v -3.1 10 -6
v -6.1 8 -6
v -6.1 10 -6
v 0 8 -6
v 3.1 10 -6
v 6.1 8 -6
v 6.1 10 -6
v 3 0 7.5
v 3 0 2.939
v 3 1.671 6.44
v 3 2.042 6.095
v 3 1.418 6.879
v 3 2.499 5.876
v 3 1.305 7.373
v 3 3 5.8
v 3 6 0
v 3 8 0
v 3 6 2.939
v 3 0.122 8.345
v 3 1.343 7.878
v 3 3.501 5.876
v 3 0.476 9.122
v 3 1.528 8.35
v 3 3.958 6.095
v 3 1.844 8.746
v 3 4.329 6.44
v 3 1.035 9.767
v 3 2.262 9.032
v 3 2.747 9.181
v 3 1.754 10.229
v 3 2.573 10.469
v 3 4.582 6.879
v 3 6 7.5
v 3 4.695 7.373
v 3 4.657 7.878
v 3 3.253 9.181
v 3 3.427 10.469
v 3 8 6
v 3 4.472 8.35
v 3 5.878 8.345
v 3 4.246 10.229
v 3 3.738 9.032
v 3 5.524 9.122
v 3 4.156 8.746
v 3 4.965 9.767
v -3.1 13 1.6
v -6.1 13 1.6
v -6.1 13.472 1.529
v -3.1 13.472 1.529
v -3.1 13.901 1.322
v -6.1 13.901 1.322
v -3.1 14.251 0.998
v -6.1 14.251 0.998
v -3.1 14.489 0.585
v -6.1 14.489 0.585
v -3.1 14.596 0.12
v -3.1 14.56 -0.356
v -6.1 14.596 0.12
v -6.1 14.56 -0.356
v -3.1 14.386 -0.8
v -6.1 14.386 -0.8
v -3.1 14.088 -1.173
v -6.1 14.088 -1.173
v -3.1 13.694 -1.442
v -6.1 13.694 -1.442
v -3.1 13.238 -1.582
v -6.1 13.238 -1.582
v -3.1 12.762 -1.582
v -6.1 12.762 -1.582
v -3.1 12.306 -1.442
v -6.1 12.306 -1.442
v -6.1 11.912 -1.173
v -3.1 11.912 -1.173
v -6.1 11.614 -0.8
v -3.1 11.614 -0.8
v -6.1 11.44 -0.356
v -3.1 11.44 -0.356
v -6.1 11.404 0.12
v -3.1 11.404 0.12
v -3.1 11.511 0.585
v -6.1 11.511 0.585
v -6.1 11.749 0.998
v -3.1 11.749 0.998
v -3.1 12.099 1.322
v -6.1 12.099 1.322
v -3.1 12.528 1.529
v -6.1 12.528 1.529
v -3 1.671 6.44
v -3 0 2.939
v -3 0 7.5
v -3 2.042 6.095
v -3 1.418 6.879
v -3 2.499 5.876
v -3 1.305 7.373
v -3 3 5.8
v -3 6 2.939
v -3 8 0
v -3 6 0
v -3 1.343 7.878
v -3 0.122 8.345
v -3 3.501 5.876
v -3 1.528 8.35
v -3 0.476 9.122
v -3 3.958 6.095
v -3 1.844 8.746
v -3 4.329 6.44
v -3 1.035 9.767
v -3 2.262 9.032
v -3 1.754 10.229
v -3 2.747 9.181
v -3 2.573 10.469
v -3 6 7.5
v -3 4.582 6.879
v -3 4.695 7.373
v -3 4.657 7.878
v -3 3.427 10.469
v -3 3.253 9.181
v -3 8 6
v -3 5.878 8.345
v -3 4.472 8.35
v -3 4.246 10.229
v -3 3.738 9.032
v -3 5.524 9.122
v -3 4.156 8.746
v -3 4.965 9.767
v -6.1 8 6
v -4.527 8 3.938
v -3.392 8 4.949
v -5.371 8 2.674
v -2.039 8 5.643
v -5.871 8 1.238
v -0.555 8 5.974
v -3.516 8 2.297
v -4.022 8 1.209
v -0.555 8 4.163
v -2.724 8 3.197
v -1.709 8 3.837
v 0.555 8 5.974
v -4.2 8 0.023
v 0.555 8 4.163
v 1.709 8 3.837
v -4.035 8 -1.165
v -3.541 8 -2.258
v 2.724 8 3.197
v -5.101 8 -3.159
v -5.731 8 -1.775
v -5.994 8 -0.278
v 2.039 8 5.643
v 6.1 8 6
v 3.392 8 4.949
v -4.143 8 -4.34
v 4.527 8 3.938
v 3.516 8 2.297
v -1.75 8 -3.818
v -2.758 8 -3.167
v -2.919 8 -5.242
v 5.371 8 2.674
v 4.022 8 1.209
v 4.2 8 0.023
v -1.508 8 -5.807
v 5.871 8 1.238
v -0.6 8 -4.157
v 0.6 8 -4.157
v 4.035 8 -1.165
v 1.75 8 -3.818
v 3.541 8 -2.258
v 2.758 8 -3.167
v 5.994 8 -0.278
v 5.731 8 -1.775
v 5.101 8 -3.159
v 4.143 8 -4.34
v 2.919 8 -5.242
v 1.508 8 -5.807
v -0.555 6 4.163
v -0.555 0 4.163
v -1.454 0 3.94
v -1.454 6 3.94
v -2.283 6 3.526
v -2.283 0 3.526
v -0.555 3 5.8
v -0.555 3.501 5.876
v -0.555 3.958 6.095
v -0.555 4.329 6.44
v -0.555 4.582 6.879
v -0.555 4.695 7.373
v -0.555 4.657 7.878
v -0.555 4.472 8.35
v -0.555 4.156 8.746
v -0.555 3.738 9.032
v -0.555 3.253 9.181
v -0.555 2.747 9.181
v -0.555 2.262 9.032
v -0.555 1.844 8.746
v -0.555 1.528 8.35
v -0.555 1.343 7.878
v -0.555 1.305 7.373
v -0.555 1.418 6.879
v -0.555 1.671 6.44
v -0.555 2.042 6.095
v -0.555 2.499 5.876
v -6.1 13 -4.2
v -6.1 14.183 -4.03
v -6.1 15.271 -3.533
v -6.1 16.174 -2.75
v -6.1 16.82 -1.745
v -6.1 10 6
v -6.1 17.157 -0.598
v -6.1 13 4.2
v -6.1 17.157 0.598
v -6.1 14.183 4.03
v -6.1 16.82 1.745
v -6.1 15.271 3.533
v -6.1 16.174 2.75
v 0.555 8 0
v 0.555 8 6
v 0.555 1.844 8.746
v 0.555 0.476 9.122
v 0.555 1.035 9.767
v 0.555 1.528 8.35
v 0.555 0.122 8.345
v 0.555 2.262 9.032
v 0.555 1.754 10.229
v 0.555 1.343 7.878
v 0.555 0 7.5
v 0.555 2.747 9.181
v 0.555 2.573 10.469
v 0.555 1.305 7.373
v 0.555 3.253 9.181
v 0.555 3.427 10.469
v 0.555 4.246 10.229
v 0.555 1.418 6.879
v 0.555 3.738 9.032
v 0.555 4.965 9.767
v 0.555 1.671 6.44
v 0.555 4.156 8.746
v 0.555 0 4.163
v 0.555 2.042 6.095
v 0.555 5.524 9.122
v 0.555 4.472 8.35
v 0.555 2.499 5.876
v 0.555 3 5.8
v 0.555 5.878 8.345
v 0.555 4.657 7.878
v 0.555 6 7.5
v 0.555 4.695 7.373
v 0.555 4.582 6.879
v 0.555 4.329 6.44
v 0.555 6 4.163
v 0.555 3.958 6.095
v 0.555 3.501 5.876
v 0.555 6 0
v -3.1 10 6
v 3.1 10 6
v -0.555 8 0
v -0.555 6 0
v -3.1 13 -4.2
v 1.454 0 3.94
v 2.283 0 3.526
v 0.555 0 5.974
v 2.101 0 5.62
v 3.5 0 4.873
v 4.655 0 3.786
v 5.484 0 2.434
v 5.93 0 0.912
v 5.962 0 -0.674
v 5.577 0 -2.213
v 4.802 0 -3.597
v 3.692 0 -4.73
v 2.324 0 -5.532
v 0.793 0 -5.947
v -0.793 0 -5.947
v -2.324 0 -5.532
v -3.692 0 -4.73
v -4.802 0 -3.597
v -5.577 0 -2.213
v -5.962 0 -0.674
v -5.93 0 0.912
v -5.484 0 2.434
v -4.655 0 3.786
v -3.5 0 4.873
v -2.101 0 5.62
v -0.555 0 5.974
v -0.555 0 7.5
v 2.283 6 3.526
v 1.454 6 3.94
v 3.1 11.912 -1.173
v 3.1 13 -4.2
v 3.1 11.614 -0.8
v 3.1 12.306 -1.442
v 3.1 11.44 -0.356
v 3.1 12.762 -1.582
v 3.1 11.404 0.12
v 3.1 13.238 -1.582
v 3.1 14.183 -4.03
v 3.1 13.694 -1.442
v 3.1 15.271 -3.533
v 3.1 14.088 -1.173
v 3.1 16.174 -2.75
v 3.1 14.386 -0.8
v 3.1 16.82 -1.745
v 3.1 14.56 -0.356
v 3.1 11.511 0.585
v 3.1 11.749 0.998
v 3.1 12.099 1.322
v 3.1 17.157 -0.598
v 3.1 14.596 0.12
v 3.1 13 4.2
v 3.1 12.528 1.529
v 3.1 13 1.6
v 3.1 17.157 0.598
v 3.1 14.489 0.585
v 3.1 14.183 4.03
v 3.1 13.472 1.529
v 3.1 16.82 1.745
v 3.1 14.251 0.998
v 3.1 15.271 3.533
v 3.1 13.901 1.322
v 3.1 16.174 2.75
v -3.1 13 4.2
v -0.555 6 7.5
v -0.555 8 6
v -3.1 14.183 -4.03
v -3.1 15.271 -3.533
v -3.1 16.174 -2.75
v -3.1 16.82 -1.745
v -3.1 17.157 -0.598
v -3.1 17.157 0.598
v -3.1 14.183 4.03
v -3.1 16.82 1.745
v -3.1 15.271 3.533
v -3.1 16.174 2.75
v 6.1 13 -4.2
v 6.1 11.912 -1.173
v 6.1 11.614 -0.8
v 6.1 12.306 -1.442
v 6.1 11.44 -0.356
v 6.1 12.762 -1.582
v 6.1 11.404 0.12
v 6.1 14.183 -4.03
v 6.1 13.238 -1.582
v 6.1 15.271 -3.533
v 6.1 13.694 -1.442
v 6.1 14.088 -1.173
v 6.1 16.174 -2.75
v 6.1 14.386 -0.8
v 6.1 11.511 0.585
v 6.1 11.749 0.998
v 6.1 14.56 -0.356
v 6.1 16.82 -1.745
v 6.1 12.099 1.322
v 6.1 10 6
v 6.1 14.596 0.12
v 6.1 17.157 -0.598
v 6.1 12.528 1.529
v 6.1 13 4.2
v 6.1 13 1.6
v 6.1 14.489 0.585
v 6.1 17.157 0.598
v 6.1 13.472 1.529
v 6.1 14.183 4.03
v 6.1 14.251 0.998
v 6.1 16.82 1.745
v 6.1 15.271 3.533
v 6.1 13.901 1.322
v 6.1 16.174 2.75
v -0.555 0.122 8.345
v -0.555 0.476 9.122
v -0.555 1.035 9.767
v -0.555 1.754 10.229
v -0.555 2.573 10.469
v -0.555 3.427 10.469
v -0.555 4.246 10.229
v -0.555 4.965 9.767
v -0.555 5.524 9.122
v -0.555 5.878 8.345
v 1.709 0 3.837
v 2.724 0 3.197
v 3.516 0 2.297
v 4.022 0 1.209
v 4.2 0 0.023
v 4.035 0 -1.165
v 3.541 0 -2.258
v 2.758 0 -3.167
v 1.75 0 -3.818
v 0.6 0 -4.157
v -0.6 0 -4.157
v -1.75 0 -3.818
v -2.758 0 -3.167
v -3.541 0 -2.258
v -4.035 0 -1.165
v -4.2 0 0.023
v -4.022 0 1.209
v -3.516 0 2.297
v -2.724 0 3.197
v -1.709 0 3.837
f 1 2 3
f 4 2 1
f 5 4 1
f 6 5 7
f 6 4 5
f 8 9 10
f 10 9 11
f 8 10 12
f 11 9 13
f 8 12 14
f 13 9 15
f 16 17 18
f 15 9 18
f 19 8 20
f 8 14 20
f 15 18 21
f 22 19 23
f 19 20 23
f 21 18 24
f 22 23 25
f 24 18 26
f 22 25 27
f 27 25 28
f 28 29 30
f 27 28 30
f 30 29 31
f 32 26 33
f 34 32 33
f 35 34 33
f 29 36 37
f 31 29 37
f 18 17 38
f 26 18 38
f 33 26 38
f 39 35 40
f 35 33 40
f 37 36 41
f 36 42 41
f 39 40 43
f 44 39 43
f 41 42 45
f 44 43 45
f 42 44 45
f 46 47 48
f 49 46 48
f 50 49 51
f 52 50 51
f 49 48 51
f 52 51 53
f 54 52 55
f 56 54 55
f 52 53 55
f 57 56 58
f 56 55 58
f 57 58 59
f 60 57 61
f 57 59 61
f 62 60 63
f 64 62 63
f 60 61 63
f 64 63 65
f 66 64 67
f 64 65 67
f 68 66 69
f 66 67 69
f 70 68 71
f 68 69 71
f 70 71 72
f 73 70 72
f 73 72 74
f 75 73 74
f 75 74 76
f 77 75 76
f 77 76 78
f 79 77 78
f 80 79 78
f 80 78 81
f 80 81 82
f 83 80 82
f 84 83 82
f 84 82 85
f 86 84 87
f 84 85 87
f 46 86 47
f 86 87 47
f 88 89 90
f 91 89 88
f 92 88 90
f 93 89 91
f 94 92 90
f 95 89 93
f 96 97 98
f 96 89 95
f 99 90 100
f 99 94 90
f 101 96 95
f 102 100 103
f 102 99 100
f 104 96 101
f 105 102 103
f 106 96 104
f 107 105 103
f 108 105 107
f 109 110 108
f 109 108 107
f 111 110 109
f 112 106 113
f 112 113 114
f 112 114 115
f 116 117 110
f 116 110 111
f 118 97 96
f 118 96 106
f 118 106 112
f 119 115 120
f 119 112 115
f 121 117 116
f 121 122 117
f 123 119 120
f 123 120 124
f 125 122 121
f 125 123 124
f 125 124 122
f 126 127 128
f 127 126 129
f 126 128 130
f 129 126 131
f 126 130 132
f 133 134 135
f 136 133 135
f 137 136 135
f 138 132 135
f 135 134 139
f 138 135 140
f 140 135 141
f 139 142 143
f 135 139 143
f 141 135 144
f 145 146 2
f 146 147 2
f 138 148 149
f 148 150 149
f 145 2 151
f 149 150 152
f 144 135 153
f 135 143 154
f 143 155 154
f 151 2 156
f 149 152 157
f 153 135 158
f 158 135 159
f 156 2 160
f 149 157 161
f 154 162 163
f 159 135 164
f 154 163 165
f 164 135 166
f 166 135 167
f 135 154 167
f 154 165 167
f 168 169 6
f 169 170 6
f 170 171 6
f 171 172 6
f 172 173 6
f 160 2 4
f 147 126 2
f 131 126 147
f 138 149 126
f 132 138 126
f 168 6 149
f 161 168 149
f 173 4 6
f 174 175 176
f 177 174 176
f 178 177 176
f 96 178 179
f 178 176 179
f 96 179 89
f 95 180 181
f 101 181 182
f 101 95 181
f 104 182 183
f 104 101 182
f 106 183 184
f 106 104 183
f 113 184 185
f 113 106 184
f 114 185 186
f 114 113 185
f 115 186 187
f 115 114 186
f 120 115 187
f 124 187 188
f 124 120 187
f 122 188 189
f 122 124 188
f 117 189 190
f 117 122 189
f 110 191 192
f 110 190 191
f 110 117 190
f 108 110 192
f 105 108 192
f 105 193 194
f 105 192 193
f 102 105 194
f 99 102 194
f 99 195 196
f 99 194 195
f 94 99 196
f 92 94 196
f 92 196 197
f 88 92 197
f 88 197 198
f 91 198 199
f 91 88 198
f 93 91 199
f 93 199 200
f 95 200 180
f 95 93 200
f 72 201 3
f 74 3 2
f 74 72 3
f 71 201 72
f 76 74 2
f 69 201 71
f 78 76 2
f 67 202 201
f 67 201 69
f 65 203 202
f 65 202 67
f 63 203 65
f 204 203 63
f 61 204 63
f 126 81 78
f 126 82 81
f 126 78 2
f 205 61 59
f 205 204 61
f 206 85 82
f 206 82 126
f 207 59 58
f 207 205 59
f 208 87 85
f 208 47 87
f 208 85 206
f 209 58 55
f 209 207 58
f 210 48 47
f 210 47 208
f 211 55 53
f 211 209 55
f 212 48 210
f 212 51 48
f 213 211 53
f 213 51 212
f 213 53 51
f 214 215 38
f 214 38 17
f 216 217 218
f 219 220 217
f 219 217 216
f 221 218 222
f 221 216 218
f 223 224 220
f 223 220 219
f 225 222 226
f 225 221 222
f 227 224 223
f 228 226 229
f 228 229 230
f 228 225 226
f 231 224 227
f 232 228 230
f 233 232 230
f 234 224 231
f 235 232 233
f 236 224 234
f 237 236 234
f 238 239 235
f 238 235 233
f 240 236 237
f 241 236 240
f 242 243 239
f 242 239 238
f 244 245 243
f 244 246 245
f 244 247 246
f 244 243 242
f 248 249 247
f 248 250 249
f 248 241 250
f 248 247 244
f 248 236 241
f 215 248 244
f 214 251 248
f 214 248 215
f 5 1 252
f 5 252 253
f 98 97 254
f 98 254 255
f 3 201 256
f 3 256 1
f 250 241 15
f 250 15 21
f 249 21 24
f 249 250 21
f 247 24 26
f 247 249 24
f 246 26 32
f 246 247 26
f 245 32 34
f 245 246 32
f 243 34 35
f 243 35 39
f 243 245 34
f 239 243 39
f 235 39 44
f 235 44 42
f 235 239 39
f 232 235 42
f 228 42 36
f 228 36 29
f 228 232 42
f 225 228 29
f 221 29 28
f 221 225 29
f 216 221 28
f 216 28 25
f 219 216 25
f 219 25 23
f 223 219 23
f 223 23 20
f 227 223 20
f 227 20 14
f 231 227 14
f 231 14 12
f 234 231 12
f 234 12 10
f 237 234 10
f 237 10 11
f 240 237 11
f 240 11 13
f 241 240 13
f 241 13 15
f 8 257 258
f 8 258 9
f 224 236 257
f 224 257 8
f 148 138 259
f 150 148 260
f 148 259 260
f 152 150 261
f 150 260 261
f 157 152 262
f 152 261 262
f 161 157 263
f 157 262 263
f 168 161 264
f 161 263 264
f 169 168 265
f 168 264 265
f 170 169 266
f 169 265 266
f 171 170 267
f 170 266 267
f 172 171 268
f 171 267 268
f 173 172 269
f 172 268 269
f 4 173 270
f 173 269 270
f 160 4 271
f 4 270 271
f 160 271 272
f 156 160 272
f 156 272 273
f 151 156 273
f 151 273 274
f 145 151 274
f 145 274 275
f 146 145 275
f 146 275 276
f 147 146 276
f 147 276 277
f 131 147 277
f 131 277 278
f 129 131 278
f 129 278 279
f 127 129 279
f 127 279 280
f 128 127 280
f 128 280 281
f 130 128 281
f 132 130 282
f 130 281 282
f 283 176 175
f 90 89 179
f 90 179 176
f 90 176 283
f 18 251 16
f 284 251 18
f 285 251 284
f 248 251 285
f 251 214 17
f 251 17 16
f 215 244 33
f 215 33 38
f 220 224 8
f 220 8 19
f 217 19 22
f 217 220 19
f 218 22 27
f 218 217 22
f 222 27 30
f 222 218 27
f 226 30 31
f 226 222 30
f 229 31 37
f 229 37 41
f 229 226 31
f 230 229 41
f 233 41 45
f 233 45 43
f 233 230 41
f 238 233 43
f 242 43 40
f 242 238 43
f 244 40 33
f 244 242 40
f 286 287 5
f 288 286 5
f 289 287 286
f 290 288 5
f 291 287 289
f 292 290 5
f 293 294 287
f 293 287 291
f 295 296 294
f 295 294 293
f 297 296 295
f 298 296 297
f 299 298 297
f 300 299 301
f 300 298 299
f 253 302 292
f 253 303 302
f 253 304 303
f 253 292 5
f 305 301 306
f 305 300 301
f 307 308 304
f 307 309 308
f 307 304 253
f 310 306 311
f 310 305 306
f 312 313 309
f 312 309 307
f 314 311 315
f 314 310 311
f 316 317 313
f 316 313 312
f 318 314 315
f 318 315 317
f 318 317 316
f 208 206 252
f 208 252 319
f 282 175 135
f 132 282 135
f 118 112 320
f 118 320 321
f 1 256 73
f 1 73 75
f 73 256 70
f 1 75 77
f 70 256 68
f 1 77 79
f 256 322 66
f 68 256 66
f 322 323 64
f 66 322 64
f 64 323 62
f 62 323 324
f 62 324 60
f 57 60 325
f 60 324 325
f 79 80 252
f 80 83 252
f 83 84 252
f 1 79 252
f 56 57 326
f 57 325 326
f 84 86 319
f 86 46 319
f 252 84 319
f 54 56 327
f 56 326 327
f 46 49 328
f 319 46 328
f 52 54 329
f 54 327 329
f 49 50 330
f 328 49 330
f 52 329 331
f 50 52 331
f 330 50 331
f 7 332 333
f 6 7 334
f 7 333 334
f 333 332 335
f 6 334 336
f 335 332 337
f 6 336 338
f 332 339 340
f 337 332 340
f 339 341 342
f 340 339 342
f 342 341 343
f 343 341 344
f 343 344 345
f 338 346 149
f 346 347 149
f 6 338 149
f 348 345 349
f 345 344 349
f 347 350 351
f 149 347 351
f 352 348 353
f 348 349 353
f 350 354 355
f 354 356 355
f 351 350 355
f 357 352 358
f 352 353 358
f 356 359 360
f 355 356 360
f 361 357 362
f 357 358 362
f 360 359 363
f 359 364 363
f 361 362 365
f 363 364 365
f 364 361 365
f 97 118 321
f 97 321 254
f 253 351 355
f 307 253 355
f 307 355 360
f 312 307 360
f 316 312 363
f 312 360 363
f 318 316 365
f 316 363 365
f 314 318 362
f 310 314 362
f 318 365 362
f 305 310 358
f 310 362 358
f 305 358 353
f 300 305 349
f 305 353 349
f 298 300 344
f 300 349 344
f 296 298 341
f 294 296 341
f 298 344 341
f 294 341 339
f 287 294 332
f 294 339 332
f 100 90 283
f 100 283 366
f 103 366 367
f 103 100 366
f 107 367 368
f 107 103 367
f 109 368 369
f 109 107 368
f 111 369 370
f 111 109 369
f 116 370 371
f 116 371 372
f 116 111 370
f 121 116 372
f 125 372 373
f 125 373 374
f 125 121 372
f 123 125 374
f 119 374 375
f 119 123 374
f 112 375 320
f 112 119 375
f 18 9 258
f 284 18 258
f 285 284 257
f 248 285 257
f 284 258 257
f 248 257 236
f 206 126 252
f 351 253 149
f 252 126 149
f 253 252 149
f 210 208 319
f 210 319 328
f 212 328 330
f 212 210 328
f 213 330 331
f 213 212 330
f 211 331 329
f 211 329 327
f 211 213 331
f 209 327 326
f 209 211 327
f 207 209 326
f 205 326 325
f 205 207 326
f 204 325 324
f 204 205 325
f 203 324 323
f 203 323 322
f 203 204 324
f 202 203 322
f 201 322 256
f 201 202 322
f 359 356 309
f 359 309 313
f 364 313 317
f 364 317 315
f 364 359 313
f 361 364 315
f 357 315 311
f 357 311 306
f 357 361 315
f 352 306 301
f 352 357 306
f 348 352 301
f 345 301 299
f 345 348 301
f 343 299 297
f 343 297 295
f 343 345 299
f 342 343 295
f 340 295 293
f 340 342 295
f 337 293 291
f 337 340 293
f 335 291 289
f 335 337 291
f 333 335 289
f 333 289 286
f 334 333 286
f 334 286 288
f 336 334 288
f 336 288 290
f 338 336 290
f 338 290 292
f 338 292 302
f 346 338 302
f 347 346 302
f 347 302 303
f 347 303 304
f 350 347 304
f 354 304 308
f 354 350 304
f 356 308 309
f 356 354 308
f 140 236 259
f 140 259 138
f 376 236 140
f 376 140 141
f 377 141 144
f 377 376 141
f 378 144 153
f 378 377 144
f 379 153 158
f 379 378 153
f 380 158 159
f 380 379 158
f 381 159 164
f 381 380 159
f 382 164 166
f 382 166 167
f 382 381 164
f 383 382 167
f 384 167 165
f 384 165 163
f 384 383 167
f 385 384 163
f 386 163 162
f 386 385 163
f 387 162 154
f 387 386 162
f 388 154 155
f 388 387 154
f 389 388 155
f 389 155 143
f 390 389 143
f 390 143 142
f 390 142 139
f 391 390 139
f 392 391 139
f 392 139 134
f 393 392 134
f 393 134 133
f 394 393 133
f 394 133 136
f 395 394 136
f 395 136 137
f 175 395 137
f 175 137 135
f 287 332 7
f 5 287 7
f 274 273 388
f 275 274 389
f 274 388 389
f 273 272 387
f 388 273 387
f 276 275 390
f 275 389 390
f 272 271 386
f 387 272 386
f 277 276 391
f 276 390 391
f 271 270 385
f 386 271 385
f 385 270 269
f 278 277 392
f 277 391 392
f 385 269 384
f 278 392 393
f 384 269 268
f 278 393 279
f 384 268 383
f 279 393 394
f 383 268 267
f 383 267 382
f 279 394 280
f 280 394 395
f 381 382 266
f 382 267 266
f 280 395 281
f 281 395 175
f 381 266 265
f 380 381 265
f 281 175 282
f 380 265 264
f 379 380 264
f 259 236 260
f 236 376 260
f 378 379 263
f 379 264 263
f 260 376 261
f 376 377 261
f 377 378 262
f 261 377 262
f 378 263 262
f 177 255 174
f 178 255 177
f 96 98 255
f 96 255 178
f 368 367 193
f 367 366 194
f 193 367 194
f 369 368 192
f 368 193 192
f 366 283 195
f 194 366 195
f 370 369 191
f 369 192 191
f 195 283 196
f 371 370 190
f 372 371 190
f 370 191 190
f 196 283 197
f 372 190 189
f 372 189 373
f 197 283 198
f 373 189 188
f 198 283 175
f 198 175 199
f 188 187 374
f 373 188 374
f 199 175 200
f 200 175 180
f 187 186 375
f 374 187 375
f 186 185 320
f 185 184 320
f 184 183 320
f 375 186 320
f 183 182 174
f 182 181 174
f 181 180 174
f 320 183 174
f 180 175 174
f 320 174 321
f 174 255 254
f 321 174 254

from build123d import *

# Parameters (mm, degrees)
SKETCH_1_R           = 6
SKETCH_1_R_2         = 4.2
EXTRUDE_1_DEPTH      = 8
SKETCH_2_W           = 12.2
SKETCH_2_H           = 12
EXTRUDE_2_DEPTH      = 2
SKETCH_3_R           = 1.6
EXTRUDE_3_DEPTH      = 3
EXTRUDE_4_DEPTH      = 3
EXTRUDE_4_DEPTH_BACK = 3
SKETCH_4_R           = 1.7
SKETCH_5_R           = 4.2
CUT_EXTRUDE_1_DEPTH  = 6
SKETCH_6_W           = 1.109396916
SKETCH_6_H           = 8
CUT_EXTRUDE_2_DEPTH  = 22.054690689


with BuildPart() as part:
    # 草图1 → 凸台-拉伸1 (new body)
    with BuildSketch(Plane(origin=(0, 0, 0), x_dir=(1, 0, 0), z_dir=(0, 1, 0))):
        with Locations(Location((0, 0, 0), (0, 0, 270))):
            Circle(SKETCH_1_R)
        with Locations(Location((0, 0, 0), (0, 0, 270))):
            Circle(SKETCH_1_R_2, mode=Mode.SUBTRACT)
    extrude(amount=EXTRUDE_1_DEPTH)

    # 草图2 → 凸台-拉伸2 (add)
    with BuildSketch(Plane(origin=(0, 8, 0), x_dir=(1, 0, 0), z_dir=(0, 1, 0))):
        Rectangle(SKETCH_2_W, SKETCH_2_H)
    extrude_2 = extrude(amount=EXTRUDE_2_DEPTH)

    # 草图3 → 凸台-拉伸3 (add)
    with BuildSketch(Plane.ZY.offset(6.1)):
        with BuildLine():
            Line((-6, 10), (6, 10))
            Line((6, 10), (4.2, 13))
            ThreePointArc((4.2, 13), (0, 17.2), (-4.2, 13))
            Line((-4.2, 13), (-6, 10))
        make_face()
        with Locations((0, 13)):
            Circle(SKETCH_3_R, mode=Mode.SUBTRACT)
    extrude_3 = extrude(amount=-EXTRUDE_3_DEPTH)

    # 镜向1: 凸台-拉伸2, 凸台-拉伸3 across plane
    add(extrude_2.mirror(Plane(origin=(0, 0, 0), x_dir=(0, 0, 1), z_dir=(1, 0, 0))))
    add(extrude_3.mirror(Plane(origin=(0, 0, 0), x_dir=(0, 0, 1), z_dir=(1, 0, 0))))


with BuildPart() as body_2:
    # 草图4 → 凸台-拉伸4 (new, two sides: drawn at the far end of the back side and taken through both)
    with BuildSketch(Plane(origin=(0, 0, 0), x_dir=(0, 0, -1), z_dir=(1, 0, 0)).offset(-EXTRUDE_4_DEPTH_BACK)):
        with BuildLine():
            Line((-6, 8), (0, 8))
            Line((0, 8), (0, 0))
            Line((0, 0), (-7.5, 0))
            ThreePointArc((-7.5, 0), (-10.5, 3), (-7.5, 6))
            Line((-7.5, 6), (-6, 8))
        make_face()
        with Locations((-7.5, 3)):
            Circle(SKETCH_4_R, mode=Mode.SUBTRACT)
    extrude(amount=EXTRUDE_4_DEPTH + EXTRUDE_4_DEPTH_BACK)

    # 草图5 → 切除-拉伸1 (cut)
    with BuildSketch(Plane.XZ):
        with Locations(Location((0, 0, 0), (0, 0, 90))):
            Circle(SKETCH_5_R)
    extrude(amount=-CUT_EXTRUDE_1_DEPTH, mode=Mode.SUBTRACT)


with BuildPart() as cut_extrude_2_tool:
    # 草图6 → 切除-拉伸2 (new, through all)
    with BuildSketch(Plane.XY):
        with Locations((0, 4)):
            Rectangle(SKETCH_6_W, SKETCH_6_H)
    extrude(amount=CUT_EXTRUDE_2_DEPTH)


with BuildPart() as part_1:
    add(part.part)

    # 切除-拉伸2: cut by cut_extrude_2_tool
    add(cut_extrude_2_tool.part, mode=Mode.SUBTRACT)


with BuildPart() as body_2_1:
    add(body_2.part)

    # 切除-拉伸2: cut by cut_extrude_2_tool
    add(cut_extrude_2_tool.part, mode=Mode.SUBTRACT)


solid = Compound([part_1.part, body_2_1.part])
